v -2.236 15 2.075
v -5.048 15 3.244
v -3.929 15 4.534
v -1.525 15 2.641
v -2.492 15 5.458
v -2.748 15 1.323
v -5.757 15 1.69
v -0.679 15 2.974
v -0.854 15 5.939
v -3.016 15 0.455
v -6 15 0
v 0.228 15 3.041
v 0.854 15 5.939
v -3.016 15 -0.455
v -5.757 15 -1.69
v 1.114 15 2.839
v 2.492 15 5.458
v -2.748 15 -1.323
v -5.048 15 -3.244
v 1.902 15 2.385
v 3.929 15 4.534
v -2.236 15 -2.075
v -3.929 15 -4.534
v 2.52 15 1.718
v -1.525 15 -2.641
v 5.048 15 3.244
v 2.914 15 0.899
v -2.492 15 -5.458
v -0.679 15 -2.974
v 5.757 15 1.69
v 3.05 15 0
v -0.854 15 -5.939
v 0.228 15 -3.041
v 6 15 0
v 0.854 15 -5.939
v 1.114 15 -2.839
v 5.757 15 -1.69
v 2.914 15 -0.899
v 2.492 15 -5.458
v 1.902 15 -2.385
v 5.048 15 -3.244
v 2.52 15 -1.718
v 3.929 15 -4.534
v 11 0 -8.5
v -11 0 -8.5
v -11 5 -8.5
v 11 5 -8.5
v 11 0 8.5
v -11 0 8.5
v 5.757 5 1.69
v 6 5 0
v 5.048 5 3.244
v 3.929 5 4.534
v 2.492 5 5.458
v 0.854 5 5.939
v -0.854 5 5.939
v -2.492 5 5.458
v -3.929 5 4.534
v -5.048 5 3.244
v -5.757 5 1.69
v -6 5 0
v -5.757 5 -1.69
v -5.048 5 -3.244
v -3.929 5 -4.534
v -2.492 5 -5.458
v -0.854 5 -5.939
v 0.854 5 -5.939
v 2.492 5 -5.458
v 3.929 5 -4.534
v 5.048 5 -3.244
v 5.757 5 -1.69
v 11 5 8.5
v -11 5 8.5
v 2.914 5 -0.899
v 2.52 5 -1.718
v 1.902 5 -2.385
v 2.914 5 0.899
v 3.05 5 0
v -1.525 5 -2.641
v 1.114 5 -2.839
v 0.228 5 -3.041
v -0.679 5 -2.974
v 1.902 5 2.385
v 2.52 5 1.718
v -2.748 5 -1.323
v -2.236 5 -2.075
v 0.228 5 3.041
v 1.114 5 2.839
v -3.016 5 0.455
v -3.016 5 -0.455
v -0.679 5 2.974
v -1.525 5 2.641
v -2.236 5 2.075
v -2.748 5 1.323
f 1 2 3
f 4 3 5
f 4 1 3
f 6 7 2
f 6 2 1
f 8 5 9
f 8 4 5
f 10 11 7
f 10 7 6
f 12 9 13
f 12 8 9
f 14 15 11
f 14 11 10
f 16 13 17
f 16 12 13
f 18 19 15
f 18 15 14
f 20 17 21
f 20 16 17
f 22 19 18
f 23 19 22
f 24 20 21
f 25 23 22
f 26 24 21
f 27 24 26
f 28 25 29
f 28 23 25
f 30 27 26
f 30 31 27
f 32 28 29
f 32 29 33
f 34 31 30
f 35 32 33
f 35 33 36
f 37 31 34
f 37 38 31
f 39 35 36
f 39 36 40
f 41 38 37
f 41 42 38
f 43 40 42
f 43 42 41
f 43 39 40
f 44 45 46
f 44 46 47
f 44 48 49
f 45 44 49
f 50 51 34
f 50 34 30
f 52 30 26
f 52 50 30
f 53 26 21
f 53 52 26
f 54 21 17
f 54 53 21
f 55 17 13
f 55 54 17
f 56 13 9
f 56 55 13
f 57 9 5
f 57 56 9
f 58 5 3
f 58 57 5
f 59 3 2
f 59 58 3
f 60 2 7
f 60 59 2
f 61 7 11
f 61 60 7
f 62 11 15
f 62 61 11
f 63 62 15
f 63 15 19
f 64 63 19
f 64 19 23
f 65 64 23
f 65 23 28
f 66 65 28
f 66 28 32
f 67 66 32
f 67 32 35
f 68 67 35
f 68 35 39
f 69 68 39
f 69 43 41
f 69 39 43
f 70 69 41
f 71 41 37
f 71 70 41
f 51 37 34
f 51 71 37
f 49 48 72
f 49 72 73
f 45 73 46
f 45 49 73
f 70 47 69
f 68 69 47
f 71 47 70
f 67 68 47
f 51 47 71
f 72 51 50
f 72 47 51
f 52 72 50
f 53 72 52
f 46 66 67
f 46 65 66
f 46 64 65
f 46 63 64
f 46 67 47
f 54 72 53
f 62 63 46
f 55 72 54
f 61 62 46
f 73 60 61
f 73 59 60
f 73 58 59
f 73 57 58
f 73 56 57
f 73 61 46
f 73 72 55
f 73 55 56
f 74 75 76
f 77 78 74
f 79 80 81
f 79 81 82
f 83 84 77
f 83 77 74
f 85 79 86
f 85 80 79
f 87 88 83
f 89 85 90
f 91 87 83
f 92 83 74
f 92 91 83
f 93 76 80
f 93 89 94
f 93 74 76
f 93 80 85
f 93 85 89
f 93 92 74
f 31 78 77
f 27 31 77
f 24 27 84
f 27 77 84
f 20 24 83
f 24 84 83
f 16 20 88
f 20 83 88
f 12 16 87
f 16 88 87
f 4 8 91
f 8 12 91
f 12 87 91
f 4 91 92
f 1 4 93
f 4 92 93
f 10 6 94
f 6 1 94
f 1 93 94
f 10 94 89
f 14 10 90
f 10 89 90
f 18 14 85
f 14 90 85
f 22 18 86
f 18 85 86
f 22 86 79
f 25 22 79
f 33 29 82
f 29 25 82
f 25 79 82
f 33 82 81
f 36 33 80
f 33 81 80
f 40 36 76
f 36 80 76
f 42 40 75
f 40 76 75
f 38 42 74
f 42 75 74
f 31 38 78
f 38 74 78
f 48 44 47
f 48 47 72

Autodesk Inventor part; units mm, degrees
ref_plane "YZ Plane" through (0, 0, 0) normal (1, 0, 0) x (0, 1, 0)
ref_plane "XZ Plane" through (0, 0, 0) normal (0, 1, 0) x (-1, 0, 0)
ref_plane "XY Plane" through (0, 0, 0) normal (0, 0, 1) x (1, 0, 0)
sketch "Sketch1" plane through (0, 0, 0) normal (0, 1, 0) x (-1, 0, 0)
  line L0 (11, -8.5) -> (-11, -8.5)
  line L1 (-11, -8.5) -> (-11, 8.5)
  line L2 (-11, 8.5) -> (11, 8.5)
  line L3 (11, 8.5) -> (11, -8.5)
  line L4 (11, -8.5) -> (-11, 8.5) construction
  line L5 (-11, -8.5) -> (11, 8.5) construction
  point P0 (0, 0)
  dimension "d0" = 22
  dimension "d1" = 17
extrude "Extrusion1" add sketch "Sketch1" along normal blind 5
sketch "Sketch2" plane through (0, 5, 0) normal (0, 1, 0) x (1, 0, 0)
  circle A0 centre (0, 0) radius 6
  circle A1 centre (0, 0) radius 3.05
  dimension "d4" = 12
  dimension "d5" = 6.1
extrude "Extrusion2" add sketch "Sketch2" along normal blind 10
properties part number "imusupport"
